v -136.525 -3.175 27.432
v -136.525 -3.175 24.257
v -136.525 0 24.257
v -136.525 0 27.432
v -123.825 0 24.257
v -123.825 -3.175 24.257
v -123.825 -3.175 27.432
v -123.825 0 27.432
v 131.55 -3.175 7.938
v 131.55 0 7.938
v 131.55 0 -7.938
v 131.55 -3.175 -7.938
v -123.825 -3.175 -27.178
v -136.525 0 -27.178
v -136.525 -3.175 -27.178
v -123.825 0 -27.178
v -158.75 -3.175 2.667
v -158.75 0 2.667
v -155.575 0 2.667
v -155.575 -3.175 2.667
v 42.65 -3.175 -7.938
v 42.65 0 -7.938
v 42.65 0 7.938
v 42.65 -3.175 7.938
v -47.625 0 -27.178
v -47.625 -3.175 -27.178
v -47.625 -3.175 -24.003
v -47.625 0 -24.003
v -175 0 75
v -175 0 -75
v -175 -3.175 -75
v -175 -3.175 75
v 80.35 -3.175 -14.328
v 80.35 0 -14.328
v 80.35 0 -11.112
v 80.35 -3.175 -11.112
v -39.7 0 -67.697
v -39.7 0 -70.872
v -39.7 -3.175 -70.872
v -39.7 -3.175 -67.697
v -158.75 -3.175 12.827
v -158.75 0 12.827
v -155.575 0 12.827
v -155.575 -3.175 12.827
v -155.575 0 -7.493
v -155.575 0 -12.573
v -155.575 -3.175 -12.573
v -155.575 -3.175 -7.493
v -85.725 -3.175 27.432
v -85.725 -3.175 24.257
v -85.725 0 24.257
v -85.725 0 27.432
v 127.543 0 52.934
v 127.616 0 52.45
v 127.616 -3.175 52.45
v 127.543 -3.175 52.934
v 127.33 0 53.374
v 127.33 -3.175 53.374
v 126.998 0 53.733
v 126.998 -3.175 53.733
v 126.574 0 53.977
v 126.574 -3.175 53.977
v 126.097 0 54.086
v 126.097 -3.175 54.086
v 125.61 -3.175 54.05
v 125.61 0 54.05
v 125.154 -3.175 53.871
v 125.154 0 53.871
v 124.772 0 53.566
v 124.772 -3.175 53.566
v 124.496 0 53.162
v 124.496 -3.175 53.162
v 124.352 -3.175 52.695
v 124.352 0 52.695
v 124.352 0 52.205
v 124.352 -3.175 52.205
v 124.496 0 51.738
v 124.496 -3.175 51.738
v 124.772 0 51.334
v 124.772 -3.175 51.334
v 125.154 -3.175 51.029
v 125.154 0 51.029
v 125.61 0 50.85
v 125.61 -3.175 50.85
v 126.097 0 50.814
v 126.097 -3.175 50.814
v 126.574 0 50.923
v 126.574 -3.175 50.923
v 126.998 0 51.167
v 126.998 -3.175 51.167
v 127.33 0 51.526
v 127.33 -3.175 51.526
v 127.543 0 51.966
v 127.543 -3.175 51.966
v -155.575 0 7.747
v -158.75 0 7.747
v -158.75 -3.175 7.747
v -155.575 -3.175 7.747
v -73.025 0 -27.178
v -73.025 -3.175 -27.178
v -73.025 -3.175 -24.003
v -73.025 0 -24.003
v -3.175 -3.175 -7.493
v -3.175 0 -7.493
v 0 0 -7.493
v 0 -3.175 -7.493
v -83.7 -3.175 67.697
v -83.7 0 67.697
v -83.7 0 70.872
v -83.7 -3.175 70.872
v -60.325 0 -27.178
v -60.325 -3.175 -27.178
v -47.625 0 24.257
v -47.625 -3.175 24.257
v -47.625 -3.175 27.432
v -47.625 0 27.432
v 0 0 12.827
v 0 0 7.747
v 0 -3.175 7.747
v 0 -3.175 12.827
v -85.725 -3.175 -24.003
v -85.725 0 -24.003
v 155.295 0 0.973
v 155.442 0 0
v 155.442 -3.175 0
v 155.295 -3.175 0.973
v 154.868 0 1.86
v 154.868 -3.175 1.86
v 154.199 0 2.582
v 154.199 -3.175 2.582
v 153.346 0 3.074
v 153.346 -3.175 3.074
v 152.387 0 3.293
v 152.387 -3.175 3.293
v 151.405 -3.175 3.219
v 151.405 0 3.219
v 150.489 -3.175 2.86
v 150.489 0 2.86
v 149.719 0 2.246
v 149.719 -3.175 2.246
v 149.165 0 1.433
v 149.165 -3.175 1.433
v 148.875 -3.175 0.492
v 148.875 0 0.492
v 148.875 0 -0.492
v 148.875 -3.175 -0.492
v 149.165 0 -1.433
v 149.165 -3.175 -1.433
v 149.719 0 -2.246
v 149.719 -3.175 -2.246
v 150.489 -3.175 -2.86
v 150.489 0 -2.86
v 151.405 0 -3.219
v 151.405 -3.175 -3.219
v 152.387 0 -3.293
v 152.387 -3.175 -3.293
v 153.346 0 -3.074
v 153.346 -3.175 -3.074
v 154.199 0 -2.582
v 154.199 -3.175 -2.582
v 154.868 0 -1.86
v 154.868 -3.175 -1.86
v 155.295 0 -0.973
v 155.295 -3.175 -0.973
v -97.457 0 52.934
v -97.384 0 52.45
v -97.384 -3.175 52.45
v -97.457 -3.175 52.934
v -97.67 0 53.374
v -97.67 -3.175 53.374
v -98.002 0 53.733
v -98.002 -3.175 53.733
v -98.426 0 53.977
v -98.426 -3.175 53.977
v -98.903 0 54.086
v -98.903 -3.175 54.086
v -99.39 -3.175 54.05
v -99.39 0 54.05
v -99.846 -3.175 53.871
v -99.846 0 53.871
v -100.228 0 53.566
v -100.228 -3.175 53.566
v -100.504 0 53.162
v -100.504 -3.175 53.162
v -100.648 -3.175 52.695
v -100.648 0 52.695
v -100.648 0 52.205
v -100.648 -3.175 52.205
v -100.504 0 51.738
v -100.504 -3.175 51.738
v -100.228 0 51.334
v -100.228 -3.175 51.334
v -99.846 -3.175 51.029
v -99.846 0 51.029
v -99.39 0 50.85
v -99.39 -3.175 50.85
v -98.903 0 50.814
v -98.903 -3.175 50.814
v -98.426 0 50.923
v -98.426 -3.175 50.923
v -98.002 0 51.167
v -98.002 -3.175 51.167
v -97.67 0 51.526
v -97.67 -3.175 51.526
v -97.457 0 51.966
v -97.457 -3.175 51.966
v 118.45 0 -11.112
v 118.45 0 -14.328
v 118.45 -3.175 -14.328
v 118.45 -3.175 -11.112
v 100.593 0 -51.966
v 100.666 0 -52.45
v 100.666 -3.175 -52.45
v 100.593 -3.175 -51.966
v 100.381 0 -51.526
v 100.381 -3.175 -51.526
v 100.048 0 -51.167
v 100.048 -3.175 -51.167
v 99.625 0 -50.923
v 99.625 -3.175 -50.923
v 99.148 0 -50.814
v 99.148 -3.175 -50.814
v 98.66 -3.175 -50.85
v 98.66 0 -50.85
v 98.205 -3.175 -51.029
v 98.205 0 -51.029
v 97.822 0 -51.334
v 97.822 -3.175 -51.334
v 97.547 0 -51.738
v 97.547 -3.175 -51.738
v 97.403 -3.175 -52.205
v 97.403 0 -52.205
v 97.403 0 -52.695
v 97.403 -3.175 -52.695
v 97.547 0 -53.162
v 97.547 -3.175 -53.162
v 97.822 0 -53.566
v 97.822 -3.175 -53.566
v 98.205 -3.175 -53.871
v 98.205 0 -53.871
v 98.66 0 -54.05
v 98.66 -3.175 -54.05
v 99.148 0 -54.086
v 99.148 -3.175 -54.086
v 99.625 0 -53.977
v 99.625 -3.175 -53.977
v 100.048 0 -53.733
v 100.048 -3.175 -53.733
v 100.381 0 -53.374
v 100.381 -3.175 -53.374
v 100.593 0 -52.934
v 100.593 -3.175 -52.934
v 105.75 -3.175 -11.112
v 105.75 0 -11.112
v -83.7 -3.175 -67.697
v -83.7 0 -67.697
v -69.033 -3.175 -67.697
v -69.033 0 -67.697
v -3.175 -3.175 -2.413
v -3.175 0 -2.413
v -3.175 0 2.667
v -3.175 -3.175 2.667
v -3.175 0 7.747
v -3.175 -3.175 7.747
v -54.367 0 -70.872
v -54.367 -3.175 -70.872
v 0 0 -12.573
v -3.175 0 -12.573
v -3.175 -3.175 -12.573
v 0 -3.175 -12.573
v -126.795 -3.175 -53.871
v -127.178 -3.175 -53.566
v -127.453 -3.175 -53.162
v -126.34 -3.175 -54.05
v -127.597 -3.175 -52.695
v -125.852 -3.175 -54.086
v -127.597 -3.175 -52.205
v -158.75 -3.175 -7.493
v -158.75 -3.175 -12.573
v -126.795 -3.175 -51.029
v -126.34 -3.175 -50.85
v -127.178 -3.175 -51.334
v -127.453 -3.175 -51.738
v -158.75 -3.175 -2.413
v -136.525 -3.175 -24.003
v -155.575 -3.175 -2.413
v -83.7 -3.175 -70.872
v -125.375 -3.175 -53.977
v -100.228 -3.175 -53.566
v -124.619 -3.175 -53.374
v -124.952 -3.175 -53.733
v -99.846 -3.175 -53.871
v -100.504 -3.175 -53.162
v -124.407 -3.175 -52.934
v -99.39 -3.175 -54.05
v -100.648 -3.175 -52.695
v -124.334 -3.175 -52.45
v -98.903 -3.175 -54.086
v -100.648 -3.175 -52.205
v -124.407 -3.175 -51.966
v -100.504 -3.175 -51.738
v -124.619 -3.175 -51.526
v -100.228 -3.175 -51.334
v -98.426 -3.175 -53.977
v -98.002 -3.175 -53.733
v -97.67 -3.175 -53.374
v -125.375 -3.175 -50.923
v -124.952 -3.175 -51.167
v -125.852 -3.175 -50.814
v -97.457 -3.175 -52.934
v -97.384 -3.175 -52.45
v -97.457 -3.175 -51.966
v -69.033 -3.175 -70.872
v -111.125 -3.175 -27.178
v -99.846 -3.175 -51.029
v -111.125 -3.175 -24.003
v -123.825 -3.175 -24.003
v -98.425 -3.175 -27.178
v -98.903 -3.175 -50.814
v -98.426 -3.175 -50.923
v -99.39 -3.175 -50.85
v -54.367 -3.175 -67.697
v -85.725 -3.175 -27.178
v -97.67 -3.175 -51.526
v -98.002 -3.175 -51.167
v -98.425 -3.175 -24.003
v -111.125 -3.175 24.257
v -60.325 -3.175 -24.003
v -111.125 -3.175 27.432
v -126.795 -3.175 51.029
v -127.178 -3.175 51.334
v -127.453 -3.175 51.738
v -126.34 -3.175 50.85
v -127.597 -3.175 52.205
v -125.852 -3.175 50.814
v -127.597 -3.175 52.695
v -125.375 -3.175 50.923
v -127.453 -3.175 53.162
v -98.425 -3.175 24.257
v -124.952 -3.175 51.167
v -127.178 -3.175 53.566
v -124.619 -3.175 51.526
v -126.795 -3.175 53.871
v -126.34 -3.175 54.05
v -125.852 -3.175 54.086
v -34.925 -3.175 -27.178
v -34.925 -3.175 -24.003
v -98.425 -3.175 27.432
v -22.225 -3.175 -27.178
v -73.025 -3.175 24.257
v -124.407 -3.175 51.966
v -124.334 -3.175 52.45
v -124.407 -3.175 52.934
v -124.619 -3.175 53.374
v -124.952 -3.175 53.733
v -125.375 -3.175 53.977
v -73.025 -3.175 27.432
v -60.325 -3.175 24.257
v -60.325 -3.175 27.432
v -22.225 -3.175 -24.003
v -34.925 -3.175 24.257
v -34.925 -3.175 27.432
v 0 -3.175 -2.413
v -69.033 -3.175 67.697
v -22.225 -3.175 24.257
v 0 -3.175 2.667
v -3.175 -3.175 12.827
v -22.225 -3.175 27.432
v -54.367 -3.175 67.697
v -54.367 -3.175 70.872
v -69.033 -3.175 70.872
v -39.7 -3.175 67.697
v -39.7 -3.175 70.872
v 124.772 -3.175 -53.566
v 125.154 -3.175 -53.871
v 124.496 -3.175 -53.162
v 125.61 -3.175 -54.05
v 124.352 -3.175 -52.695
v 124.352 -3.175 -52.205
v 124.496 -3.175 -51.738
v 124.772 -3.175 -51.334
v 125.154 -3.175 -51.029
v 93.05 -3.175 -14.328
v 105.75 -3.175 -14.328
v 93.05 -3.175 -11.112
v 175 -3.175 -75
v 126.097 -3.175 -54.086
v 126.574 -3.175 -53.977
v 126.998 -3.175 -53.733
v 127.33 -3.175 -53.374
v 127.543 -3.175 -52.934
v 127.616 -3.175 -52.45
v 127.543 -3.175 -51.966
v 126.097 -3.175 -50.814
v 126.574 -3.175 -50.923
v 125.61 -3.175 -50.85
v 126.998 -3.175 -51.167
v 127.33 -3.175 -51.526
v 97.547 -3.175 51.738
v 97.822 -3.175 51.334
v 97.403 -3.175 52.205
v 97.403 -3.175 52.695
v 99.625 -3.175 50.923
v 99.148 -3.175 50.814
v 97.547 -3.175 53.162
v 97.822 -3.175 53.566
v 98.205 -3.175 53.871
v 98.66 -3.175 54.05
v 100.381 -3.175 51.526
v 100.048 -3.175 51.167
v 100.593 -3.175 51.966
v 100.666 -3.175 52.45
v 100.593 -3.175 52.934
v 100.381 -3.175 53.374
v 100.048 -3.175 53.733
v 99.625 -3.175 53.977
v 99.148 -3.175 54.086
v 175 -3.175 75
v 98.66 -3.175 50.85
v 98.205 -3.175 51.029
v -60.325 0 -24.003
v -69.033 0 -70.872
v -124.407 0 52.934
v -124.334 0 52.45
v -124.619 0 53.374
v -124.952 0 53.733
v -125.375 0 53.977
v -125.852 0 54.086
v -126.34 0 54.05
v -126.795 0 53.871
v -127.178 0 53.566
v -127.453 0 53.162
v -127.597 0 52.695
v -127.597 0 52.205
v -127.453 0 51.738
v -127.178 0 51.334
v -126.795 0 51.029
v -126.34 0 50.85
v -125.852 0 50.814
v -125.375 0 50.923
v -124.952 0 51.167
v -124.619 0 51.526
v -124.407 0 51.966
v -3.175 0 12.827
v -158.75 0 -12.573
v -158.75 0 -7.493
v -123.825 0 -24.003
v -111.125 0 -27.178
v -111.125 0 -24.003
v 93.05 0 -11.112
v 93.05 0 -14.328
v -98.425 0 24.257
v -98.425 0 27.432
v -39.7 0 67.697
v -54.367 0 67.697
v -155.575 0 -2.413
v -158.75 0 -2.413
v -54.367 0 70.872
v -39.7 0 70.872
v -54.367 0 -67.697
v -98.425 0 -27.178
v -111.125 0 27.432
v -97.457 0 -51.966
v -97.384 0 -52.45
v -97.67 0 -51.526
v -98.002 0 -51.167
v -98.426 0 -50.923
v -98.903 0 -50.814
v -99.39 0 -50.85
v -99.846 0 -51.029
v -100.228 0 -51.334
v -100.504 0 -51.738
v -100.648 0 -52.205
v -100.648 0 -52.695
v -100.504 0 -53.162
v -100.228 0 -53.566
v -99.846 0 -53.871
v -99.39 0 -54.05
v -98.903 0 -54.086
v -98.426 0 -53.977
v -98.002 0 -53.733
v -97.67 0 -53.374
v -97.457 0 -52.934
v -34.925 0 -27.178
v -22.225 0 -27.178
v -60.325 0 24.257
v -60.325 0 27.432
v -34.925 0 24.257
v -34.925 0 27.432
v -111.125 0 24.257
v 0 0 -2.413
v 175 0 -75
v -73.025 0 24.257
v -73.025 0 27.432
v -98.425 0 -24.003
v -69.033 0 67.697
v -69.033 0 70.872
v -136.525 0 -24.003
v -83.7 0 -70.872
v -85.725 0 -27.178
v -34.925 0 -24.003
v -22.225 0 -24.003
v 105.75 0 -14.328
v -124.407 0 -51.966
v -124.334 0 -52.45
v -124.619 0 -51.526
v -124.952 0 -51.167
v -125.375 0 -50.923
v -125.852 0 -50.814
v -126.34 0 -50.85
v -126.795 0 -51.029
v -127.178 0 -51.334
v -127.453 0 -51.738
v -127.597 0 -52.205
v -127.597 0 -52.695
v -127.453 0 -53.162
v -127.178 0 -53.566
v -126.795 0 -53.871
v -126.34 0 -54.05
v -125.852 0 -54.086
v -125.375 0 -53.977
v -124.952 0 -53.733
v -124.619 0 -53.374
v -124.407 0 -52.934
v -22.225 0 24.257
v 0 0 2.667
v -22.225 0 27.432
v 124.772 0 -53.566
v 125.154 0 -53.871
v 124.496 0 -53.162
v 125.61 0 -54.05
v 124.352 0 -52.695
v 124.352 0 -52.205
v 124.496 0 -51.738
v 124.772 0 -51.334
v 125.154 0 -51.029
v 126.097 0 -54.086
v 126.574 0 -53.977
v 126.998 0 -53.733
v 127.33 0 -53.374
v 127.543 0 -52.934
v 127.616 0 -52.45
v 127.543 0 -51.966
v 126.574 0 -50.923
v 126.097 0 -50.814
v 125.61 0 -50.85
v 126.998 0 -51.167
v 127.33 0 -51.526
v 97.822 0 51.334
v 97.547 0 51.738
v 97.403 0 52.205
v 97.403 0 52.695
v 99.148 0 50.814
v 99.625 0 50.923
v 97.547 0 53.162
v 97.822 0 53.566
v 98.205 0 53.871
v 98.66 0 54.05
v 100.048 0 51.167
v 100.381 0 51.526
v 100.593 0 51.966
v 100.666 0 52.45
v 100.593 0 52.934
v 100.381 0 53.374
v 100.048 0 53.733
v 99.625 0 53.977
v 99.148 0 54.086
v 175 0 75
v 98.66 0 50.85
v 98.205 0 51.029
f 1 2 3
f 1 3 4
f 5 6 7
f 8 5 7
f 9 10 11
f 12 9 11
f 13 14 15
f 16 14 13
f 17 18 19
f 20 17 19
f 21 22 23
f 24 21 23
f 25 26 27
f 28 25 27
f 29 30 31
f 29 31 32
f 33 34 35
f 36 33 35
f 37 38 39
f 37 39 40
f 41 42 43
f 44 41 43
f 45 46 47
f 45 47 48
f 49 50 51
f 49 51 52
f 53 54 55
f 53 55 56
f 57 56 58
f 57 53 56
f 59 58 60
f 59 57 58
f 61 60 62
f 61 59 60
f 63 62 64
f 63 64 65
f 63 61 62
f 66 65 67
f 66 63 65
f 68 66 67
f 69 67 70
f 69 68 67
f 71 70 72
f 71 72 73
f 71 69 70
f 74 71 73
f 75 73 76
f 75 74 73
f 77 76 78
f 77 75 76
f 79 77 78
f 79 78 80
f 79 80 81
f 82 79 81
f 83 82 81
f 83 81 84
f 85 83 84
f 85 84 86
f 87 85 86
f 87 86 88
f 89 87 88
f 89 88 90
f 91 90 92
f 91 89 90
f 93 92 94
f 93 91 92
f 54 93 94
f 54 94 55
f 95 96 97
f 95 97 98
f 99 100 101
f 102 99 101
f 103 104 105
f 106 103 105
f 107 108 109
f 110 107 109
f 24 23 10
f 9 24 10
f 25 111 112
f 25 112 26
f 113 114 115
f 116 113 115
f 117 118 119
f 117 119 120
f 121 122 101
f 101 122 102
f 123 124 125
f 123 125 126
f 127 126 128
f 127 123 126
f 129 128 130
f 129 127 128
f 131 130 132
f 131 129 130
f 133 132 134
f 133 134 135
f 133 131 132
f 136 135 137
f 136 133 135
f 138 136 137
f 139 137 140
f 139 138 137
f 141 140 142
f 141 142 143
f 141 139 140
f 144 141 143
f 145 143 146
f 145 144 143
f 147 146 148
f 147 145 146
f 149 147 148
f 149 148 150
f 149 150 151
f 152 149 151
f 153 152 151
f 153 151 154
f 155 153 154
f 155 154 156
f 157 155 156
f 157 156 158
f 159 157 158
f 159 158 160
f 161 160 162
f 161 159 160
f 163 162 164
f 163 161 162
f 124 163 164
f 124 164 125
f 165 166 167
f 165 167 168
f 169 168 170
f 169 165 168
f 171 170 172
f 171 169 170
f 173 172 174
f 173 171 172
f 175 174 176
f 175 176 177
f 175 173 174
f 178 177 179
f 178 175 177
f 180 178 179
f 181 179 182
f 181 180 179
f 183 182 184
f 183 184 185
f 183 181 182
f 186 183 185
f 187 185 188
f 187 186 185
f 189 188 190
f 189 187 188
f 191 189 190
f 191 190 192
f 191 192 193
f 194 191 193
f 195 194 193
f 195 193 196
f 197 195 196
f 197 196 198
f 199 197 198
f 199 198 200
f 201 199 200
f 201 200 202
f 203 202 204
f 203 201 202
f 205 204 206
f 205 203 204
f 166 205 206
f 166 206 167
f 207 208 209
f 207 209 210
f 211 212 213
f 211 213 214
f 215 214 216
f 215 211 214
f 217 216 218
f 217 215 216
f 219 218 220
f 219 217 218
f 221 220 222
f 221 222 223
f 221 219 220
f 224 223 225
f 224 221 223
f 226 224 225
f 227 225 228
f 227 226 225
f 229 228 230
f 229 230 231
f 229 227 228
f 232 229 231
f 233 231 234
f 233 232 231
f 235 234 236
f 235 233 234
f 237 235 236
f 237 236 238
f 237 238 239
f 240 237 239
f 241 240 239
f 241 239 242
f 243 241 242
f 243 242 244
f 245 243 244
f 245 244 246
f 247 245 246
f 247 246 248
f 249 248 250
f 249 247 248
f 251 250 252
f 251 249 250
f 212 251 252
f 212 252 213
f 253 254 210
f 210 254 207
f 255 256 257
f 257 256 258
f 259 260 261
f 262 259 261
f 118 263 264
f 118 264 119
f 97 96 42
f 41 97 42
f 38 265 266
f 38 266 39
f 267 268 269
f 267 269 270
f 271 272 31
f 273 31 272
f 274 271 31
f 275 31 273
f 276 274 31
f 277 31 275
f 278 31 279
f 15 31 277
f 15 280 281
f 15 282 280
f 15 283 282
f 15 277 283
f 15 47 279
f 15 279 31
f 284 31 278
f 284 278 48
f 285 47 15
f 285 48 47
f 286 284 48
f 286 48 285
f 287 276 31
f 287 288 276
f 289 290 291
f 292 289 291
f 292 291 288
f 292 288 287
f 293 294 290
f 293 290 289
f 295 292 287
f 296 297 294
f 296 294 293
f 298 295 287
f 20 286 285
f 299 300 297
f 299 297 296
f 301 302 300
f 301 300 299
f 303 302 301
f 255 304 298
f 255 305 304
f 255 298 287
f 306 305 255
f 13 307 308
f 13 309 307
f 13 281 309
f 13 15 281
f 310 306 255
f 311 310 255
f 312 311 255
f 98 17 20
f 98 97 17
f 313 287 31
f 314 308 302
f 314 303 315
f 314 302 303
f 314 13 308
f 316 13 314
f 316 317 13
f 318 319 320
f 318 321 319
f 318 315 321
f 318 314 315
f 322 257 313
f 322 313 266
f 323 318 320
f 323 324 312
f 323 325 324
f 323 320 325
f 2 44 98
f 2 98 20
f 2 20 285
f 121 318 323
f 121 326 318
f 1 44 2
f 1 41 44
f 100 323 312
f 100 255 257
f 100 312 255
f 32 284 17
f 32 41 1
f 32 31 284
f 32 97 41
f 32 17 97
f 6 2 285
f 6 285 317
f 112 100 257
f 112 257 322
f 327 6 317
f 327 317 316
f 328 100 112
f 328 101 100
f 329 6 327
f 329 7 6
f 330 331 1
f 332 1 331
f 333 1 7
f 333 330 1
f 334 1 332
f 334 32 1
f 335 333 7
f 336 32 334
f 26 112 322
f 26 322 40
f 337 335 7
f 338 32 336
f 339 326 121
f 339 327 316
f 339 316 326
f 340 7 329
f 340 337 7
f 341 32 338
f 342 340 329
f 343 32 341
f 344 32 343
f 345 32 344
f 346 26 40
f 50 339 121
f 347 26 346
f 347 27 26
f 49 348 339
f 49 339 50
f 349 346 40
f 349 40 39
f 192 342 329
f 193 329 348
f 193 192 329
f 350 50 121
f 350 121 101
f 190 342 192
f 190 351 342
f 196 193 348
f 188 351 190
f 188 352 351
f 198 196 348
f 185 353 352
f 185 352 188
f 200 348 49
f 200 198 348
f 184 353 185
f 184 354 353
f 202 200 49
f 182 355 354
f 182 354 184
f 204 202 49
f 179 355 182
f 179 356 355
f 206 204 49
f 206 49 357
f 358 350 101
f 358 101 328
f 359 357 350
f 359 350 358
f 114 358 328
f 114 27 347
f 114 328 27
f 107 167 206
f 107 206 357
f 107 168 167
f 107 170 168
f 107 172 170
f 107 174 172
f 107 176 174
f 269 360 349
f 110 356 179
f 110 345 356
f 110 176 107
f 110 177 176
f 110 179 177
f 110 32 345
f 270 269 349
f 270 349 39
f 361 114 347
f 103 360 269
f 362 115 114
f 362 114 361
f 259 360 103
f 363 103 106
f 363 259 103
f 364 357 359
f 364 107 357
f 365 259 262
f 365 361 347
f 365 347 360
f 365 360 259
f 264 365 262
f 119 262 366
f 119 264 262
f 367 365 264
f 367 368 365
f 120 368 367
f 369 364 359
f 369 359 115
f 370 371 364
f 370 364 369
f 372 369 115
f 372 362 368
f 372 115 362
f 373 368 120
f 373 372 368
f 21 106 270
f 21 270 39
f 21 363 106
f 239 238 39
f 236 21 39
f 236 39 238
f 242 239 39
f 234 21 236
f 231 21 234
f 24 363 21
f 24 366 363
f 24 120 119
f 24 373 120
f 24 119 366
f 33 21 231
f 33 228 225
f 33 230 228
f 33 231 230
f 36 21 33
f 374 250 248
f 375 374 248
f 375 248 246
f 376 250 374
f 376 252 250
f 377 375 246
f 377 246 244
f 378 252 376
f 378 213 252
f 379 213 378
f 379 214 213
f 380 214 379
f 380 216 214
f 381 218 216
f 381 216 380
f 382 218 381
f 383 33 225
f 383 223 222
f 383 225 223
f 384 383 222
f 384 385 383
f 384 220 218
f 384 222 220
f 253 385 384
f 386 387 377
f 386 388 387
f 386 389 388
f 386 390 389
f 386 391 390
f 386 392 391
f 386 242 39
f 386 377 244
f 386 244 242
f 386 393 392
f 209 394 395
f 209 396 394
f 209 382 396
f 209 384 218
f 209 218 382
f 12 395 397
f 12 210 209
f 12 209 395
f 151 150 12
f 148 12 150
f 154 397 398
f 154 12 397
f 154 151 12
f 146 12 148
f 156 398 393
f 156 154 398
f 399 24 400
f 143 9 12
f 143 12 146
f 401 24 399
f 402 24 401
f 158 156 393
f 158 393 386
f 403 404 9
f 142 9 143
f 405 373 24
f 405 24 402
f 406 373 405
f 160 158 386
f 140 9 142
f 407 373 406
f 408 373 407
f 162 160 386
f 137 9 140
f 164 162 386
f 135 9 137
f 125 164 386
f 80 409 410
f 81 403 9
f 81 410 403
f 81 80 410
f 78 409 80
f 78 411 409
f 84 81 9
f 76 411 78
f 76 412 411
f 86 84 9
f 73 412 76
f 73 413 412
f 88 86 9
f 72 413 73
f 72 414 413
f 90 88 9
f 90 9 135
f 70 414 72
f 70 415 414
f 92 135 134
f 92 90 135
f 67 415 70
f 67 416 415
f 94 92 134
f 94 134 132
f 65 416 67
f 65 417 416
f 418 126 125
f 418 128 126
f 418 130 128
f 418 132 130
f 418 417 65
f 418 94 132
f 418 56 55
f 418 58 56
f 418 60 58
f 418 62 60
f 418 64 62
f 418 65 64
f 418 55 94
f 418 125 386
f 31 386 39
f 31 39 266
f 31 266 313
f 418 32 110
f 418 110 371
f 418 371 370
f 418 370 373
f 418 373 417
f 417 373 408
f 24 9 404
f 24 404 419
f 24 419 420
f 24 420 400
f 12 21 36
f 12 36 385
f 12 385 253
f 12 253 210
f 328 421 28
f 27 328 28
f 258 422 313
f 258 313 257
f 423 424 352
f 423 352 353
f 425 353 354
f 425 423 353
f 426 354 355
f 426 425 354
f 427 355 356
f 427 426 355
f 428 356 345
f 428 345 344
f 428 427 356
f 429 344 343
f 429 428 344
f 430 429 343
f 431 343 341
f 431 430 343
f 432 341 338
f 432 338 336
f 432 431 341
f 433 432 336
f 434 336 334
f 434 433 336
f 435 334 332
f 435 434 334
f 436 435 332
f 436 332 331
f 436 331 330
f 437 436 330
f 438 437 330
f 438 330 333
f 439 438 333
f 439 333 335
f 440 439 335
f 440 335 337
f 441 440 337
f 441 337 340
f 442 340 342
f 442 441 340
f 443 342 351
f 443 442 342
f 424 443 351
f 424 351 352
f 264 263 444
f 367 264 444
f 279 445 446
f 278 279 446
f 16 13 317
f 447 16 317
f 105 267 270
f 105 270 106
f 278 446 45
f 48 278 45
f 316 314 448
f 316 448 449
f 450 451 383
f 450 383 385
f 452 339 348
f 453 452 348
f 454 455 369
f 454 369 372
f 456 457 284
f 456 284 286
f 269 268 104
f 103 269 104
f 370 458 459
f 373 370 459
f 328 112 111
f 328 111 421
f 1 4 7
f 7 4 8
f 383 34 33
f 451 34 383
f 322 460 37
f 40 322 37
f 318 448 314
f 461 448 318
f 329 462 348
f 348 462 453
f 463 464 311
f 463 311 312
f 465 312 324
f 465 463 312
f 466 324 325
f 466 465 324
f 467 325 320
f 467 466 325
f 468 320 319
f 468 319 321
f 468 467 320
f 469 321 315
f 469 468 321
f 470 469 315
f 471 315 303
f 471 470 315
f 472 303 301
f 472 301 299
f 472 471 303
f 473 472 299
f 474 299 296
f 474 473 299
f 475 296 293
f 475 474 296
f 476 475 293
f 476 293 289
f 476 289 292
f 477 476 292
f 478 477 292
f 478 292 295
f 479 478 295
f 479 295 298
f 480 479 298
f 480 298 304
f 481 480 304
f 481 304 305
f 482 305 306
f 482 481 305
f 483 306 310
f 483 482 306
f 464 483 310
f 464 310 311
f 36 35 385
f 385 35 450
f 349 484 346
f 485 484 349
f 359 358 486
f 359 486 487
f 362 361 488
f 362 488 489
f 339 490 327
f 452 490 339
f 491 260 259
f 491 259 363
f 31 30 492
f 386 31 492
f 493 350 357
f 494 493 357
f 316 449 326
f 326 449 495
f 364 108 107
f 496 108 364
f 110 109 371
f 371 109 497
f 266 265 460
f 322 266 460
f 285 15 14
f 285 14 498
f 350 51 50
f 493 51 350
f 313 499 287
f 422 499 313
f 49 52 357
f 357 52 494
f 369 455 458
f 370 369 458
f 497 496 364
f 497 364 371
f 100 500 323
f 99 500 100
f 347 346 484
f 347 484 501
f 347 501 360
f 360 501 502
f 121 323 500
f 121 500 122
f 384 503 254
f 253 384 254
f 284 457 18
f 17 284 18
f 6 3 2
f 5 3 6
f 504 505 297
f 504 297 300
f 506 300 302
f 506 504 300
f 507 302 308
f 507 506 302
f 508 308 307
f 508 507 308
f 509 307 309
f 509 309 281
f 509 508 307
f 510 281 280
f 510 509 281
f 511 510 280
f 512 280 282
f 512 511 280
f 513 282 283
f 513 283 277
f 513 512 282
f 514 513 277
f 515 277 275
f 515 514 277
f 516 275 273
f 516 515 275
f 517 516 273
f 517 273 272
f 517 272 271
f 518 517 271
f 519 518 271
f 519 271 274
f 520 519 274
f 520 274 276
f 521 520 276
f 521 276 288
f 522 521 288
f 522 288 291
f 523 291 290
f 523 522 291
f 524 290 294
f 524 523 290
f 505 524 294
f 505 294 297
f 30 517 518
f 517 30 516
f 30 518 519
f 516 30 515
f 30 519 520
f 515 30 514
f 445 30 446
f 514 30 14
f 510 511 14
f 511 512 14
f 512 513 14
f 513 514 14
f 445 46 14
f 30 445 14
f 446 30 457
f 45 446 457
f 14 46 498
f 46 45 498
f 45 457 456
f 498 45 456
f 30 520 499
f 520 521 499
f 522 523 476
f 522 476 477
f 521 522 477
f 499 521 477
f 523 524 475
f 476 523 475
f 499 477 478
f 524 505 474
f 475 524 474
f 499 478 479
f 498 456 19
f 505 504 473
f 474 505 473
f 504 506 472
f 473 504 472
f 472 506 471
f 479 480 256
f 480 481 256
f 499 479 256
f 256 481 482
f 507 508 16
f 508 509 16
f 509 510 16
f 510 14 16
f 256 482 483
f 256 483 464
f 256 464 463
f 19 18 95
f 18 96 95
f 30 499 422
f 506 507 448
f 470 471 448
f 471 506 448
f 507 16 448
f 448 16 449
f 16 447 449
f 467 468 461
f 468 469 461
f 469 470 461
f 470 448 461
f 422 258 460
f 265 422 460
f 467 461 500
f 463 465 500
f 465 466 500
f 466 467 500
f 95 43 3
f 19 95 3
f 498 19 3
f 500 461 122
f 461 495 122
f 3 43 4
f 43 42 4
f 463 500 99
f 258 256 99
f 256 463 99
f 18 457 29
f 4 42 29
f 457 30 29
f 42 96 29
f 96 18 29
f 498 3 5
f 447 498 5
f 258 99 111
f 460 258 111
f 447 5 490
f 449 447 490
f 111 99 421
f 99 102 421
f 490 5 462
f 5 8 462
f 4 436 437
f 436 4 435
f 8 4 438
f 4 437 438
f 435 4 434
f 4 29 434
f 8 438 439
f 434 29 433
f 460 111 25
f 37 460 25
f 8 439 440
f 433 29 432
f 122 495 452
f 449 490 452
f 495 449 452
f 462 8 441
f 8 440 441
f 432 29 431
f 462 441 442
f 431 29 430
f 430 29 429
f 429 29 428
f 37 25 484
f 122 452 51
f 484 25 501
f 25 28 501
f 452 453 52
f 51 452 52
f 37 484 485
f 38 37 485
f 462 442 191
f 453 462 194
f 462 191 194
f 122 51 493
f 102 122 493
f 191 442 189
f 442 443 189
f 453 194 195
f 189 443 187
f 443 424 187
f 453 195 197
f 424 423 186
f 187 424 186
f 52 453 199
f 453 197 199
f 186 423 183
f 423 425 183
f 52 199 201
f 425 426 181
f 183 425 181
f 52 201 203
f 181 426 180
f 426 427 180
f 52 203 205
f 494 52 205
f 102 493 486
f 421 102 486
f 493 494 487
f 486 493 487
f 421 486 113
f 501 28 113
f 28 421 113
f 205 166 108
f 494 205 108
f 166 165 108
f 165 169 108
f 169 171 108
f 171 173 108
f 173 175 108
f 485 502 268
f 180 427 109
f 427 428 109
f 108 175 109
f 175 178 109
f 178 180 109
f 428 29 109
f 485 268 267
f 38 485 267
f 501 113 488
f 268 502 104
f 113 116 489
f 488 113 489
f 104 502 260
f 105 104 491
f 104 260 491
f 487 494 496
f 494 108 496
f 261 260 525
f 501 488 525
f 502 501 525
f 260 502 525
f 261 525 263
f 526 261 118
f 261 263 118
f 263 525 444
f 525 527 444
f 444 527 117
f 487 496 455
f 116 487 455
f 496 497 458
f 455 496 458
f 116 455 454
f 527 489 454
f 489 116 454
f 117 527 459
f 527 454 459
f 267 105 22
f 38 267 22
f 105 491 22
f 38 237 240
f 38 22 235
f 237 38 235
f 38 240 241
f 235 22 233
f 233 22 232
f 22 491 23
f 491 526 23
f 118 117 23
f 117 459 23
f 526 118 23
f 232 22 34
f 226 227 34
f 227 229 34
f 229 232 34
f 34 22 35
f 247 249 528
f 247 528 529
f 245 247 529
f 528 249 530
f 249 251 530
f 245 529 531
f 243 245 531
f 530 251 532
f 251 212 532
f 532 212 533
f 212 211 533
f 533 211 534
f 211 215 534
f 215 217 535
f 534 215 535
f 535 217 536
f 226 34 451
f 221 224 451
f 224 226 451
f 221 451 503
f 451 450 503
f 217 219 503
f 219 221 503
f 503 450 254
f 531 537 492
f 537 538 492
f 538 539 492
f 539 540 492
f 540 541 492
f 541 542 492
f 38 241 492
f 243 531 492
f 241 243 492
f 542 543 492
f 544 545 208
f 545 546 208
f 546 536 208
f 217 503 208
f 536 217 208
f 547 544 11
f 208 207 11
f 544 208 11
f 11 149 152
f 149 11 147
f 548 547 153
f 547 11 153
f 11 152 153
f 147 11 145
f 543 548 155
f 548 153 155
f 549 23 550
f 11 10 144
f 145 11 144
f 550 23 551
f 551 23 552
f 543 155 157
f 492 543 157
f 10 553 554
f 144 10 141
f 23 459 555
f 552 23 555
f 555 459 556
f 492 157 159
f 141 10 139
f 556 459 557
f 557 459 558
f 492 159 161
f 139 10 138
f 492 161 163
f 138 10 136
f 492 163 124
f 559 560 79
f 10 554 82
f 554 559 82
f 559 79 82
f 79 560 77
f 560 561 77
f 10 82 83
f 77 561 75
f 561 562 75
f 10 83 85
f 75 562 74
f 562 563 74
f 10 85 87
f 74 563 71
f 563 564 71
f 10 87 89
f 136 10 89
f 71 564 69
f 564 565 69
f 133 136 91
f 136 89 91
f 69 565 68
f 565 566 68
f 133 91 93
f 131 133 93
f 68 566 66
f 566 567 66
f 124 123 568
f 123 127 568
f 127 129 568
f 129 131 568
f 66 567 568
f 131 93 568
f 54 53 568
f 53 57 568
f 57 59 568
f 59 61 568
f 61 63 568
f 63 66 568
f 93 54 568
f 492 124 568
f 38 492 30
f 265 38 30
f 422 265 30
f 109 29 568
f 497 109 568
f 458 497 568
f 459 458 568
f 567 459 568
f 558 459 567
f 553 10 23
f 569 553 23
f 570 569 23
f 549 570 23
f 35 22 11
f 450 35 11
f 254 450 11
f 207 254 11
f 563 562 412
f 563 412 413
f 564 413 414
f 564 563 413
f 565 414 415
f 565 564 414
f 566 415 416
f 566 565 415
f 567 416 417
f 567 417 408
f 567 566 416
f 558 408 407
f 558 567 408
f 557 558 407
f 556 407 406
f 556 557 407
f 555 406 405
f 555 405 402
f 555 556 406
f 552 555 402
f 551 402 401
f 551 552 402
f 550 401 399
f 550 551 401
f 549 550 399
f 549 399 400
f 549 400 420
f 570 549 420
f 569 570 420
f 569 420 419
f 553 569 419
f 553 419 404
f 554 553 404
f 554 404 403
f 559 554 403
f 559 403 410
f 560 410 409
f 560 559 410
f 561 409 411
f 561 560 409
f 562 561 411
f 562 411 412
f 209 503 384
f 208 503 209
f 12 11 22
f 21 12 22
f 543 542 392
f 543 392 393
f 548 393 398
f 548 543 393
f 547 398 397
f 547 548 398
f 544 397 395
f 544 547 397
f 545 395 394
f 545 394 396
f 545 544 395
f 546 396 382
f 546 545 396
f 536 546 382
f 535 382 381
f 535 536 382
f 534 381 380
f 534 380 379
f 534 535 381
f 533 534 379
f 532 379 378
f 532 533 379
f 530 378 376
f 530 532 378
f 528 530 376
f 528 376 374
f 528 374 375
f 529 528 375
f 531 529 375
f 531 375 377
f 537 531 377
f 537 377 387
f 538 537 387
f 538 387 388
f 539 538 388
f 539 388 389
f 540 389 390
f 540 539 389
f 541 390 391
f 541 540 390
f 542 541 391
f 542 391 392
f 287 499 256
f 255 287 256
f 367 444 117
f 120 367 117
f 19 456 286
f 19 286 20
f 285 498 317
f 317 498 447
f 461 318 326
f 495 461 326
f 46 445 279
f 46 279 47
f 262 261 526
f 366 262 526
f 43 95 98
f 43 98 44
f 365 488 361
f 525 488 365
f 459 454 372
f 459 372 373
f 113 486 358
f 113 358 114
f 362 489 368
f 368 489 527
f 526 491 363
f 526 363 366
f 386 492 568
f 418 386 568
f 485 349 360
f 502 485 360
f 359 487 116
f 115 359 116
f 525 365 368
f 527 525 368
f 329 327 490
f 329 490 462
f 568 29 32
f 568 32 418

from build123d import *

# Parameters (mm, degrees)
F0_W     = 350
F0_H     = 150
F0_R     = 1.64084
F0_W_2   = 14.666667
F0_H_2   = 3.175
F0_W_3   = 12.7
F0_W_4   = 3.175
F0_H_3   = 5.08
F0_H_4   = 3.215846
F0_R_2   = 3.302
F1_DEPTH = 3.175


with BuildPart() as f1:
    # F0 (on Front) → F1 (new body)
    with BuildSketch(Plane.XZ):
        Rectangle(F0_W, F0_H)
        with Locations((-125.9747, -52.45)):
            Circle(F0_R, mode=Mode.SUBTRACT)
        with Locations((-99.0253, -52.45)):
            Circle(F0_R, mode=Mode.SUBTRACT)
        with Locations((-76.366667, -69.285)):
            Rectangle(F0_W_2, F0_H_2, mode=Mode.SUBTRACT)
        with Locations((-47.033333, -69.285)):
            Rectangle(F0_W_2, F0_H_2, mode=Mode.SUBTRACT)
        with Locations((-130.175, -25.590497)):
            Rectangle(F0_W_3, F0_H_2, mode=Mode.SUBTRACT)
        with Locations((-104.775, -25.590497)):
            Rectangle(F0_W_3, F0_H_2, mode=Mode.SUBTRACT)
        with Locations((-157.1625, -10.032997)):
            Rectangle(F0_W_4, F0_H_3, mode=Mode.SUBTRACT)
        with Locations((-79.375, -25.590497)):
            Rectangle(F0_W_3, F0_H_2, mode=Mode.SUBTRACT)
        with Locations((-53.975, -25.590497)):
            Rectangle(F0_W_3, F0_H_2, mode=Mode.SUBTRACT)
        with Locations((-28.575, -25.590497)):
            Rectangle(F0_W_3, F0_H_2, mode=Mode.SUBTRACT)
        with Locations((-1.5875, -10.032997)):
            Rectangle(F0_W_4, F0_H_3, mode=Mode.SUBTRACT)
        with Locations((99.0253, -52.45)):
            Circle(F0_R, mode=Mode.SUBTRACT)
        with Locations((125.9747, -52.45)):
            Circle(F0_R, mode=Mode.SUBTRACT)
        with Locations((86.7, -12.720423)):
            Rectangle(F0_W_3, F0_H_4, mode=Mode.SUBTRACT)
        with Locations((112.1, -12.720423)):
            Rectangle(F0_W_3, F0_H_4, mode=Mode.SUBTRACT)
        with Locations((-157.1625, 0.127003)):
            Rectangle(F0_W_4, F0_H_3, mode=Mode.SUBTRACT)
        with Locations((-157.1625, 10.287003)):
            Rectangle(F0_W_4, F0_H_3, mode=Mode.SUBTRACT)
        with Locations((-130.175, 25.844503)):
            Rectangle(F0_W_3, F0_H_2, mode=Mode.SUBTRACT)
        with Locations((-104.775, 25.844503)):
            Rectangle(F0_W_3, F0_H_2, mode=Mode.SUBTRACT)
        with Locations((-1.5875, 0.127003)):
            Rectangle(F0_W_4, F0_H_3, mode=Mode.SUBTRACT)
        with Locations((-1.5875, 10.287003)):
            Rectangle(F0_W_4, F0_H_3, mode=Mode.SUBTRACT)
        with Locations((-79.375, 25.844503)):
            Rectangle(F0_W_3, F0_H_2, mode=Mode.SUBTRACT)
        with Locations((-53.975, 25.844503)):
            Rectangle(F0_W_3, F0_H_2, mode=Mode.SUBTRACT)
        with Locations((-28.575, 25.844503)):
            Rectangle(F0_W_3, F0_H_2, mode=Mode.SUBTRACT)
        with Locations((-125.9747, 52.45)):
            Circle(F0_R, mode=Mode.SUBTRACT)
        with Locations((-99.0253, 52.45)):
            Circle(F0_R, mode=Mode.SUBTRACT)
        with Locations((-76.366667, 69.285)):
            Rectangle(F0_W_2, F0_H_2, mode=Mode.SUBTRACT)
        with Locations((-47.033333, 69.285)):
            Rectangle(F0_W_2, F0_H_2, mode=Mode.SUBTRACT)
        Polygon((131.55, 7.9375), (131.55, -7.9375), (93.45, -7.9375), (55.35, -7.9375), (42.65, -7.9375), (42.65, 7.9375), (55.35, 7.9375), (93.45, 7.9375), align=None, mode=Mode.SUBTRACT)
        with Locations((152.14, 0)):
            Circle(F0_R_2, mode=Mode.SUBTRACT)
        with Locations((99.0253, 52.45)):
            Circle(F0_R, mode=Mode.SUBTRACT)
        with Locations((125.9747, 52.45)):
            Circle(F0_R, mode=Mode.SUBTRACT)
    extrude(amount=F1_DEPTH)


solid = f1.part
